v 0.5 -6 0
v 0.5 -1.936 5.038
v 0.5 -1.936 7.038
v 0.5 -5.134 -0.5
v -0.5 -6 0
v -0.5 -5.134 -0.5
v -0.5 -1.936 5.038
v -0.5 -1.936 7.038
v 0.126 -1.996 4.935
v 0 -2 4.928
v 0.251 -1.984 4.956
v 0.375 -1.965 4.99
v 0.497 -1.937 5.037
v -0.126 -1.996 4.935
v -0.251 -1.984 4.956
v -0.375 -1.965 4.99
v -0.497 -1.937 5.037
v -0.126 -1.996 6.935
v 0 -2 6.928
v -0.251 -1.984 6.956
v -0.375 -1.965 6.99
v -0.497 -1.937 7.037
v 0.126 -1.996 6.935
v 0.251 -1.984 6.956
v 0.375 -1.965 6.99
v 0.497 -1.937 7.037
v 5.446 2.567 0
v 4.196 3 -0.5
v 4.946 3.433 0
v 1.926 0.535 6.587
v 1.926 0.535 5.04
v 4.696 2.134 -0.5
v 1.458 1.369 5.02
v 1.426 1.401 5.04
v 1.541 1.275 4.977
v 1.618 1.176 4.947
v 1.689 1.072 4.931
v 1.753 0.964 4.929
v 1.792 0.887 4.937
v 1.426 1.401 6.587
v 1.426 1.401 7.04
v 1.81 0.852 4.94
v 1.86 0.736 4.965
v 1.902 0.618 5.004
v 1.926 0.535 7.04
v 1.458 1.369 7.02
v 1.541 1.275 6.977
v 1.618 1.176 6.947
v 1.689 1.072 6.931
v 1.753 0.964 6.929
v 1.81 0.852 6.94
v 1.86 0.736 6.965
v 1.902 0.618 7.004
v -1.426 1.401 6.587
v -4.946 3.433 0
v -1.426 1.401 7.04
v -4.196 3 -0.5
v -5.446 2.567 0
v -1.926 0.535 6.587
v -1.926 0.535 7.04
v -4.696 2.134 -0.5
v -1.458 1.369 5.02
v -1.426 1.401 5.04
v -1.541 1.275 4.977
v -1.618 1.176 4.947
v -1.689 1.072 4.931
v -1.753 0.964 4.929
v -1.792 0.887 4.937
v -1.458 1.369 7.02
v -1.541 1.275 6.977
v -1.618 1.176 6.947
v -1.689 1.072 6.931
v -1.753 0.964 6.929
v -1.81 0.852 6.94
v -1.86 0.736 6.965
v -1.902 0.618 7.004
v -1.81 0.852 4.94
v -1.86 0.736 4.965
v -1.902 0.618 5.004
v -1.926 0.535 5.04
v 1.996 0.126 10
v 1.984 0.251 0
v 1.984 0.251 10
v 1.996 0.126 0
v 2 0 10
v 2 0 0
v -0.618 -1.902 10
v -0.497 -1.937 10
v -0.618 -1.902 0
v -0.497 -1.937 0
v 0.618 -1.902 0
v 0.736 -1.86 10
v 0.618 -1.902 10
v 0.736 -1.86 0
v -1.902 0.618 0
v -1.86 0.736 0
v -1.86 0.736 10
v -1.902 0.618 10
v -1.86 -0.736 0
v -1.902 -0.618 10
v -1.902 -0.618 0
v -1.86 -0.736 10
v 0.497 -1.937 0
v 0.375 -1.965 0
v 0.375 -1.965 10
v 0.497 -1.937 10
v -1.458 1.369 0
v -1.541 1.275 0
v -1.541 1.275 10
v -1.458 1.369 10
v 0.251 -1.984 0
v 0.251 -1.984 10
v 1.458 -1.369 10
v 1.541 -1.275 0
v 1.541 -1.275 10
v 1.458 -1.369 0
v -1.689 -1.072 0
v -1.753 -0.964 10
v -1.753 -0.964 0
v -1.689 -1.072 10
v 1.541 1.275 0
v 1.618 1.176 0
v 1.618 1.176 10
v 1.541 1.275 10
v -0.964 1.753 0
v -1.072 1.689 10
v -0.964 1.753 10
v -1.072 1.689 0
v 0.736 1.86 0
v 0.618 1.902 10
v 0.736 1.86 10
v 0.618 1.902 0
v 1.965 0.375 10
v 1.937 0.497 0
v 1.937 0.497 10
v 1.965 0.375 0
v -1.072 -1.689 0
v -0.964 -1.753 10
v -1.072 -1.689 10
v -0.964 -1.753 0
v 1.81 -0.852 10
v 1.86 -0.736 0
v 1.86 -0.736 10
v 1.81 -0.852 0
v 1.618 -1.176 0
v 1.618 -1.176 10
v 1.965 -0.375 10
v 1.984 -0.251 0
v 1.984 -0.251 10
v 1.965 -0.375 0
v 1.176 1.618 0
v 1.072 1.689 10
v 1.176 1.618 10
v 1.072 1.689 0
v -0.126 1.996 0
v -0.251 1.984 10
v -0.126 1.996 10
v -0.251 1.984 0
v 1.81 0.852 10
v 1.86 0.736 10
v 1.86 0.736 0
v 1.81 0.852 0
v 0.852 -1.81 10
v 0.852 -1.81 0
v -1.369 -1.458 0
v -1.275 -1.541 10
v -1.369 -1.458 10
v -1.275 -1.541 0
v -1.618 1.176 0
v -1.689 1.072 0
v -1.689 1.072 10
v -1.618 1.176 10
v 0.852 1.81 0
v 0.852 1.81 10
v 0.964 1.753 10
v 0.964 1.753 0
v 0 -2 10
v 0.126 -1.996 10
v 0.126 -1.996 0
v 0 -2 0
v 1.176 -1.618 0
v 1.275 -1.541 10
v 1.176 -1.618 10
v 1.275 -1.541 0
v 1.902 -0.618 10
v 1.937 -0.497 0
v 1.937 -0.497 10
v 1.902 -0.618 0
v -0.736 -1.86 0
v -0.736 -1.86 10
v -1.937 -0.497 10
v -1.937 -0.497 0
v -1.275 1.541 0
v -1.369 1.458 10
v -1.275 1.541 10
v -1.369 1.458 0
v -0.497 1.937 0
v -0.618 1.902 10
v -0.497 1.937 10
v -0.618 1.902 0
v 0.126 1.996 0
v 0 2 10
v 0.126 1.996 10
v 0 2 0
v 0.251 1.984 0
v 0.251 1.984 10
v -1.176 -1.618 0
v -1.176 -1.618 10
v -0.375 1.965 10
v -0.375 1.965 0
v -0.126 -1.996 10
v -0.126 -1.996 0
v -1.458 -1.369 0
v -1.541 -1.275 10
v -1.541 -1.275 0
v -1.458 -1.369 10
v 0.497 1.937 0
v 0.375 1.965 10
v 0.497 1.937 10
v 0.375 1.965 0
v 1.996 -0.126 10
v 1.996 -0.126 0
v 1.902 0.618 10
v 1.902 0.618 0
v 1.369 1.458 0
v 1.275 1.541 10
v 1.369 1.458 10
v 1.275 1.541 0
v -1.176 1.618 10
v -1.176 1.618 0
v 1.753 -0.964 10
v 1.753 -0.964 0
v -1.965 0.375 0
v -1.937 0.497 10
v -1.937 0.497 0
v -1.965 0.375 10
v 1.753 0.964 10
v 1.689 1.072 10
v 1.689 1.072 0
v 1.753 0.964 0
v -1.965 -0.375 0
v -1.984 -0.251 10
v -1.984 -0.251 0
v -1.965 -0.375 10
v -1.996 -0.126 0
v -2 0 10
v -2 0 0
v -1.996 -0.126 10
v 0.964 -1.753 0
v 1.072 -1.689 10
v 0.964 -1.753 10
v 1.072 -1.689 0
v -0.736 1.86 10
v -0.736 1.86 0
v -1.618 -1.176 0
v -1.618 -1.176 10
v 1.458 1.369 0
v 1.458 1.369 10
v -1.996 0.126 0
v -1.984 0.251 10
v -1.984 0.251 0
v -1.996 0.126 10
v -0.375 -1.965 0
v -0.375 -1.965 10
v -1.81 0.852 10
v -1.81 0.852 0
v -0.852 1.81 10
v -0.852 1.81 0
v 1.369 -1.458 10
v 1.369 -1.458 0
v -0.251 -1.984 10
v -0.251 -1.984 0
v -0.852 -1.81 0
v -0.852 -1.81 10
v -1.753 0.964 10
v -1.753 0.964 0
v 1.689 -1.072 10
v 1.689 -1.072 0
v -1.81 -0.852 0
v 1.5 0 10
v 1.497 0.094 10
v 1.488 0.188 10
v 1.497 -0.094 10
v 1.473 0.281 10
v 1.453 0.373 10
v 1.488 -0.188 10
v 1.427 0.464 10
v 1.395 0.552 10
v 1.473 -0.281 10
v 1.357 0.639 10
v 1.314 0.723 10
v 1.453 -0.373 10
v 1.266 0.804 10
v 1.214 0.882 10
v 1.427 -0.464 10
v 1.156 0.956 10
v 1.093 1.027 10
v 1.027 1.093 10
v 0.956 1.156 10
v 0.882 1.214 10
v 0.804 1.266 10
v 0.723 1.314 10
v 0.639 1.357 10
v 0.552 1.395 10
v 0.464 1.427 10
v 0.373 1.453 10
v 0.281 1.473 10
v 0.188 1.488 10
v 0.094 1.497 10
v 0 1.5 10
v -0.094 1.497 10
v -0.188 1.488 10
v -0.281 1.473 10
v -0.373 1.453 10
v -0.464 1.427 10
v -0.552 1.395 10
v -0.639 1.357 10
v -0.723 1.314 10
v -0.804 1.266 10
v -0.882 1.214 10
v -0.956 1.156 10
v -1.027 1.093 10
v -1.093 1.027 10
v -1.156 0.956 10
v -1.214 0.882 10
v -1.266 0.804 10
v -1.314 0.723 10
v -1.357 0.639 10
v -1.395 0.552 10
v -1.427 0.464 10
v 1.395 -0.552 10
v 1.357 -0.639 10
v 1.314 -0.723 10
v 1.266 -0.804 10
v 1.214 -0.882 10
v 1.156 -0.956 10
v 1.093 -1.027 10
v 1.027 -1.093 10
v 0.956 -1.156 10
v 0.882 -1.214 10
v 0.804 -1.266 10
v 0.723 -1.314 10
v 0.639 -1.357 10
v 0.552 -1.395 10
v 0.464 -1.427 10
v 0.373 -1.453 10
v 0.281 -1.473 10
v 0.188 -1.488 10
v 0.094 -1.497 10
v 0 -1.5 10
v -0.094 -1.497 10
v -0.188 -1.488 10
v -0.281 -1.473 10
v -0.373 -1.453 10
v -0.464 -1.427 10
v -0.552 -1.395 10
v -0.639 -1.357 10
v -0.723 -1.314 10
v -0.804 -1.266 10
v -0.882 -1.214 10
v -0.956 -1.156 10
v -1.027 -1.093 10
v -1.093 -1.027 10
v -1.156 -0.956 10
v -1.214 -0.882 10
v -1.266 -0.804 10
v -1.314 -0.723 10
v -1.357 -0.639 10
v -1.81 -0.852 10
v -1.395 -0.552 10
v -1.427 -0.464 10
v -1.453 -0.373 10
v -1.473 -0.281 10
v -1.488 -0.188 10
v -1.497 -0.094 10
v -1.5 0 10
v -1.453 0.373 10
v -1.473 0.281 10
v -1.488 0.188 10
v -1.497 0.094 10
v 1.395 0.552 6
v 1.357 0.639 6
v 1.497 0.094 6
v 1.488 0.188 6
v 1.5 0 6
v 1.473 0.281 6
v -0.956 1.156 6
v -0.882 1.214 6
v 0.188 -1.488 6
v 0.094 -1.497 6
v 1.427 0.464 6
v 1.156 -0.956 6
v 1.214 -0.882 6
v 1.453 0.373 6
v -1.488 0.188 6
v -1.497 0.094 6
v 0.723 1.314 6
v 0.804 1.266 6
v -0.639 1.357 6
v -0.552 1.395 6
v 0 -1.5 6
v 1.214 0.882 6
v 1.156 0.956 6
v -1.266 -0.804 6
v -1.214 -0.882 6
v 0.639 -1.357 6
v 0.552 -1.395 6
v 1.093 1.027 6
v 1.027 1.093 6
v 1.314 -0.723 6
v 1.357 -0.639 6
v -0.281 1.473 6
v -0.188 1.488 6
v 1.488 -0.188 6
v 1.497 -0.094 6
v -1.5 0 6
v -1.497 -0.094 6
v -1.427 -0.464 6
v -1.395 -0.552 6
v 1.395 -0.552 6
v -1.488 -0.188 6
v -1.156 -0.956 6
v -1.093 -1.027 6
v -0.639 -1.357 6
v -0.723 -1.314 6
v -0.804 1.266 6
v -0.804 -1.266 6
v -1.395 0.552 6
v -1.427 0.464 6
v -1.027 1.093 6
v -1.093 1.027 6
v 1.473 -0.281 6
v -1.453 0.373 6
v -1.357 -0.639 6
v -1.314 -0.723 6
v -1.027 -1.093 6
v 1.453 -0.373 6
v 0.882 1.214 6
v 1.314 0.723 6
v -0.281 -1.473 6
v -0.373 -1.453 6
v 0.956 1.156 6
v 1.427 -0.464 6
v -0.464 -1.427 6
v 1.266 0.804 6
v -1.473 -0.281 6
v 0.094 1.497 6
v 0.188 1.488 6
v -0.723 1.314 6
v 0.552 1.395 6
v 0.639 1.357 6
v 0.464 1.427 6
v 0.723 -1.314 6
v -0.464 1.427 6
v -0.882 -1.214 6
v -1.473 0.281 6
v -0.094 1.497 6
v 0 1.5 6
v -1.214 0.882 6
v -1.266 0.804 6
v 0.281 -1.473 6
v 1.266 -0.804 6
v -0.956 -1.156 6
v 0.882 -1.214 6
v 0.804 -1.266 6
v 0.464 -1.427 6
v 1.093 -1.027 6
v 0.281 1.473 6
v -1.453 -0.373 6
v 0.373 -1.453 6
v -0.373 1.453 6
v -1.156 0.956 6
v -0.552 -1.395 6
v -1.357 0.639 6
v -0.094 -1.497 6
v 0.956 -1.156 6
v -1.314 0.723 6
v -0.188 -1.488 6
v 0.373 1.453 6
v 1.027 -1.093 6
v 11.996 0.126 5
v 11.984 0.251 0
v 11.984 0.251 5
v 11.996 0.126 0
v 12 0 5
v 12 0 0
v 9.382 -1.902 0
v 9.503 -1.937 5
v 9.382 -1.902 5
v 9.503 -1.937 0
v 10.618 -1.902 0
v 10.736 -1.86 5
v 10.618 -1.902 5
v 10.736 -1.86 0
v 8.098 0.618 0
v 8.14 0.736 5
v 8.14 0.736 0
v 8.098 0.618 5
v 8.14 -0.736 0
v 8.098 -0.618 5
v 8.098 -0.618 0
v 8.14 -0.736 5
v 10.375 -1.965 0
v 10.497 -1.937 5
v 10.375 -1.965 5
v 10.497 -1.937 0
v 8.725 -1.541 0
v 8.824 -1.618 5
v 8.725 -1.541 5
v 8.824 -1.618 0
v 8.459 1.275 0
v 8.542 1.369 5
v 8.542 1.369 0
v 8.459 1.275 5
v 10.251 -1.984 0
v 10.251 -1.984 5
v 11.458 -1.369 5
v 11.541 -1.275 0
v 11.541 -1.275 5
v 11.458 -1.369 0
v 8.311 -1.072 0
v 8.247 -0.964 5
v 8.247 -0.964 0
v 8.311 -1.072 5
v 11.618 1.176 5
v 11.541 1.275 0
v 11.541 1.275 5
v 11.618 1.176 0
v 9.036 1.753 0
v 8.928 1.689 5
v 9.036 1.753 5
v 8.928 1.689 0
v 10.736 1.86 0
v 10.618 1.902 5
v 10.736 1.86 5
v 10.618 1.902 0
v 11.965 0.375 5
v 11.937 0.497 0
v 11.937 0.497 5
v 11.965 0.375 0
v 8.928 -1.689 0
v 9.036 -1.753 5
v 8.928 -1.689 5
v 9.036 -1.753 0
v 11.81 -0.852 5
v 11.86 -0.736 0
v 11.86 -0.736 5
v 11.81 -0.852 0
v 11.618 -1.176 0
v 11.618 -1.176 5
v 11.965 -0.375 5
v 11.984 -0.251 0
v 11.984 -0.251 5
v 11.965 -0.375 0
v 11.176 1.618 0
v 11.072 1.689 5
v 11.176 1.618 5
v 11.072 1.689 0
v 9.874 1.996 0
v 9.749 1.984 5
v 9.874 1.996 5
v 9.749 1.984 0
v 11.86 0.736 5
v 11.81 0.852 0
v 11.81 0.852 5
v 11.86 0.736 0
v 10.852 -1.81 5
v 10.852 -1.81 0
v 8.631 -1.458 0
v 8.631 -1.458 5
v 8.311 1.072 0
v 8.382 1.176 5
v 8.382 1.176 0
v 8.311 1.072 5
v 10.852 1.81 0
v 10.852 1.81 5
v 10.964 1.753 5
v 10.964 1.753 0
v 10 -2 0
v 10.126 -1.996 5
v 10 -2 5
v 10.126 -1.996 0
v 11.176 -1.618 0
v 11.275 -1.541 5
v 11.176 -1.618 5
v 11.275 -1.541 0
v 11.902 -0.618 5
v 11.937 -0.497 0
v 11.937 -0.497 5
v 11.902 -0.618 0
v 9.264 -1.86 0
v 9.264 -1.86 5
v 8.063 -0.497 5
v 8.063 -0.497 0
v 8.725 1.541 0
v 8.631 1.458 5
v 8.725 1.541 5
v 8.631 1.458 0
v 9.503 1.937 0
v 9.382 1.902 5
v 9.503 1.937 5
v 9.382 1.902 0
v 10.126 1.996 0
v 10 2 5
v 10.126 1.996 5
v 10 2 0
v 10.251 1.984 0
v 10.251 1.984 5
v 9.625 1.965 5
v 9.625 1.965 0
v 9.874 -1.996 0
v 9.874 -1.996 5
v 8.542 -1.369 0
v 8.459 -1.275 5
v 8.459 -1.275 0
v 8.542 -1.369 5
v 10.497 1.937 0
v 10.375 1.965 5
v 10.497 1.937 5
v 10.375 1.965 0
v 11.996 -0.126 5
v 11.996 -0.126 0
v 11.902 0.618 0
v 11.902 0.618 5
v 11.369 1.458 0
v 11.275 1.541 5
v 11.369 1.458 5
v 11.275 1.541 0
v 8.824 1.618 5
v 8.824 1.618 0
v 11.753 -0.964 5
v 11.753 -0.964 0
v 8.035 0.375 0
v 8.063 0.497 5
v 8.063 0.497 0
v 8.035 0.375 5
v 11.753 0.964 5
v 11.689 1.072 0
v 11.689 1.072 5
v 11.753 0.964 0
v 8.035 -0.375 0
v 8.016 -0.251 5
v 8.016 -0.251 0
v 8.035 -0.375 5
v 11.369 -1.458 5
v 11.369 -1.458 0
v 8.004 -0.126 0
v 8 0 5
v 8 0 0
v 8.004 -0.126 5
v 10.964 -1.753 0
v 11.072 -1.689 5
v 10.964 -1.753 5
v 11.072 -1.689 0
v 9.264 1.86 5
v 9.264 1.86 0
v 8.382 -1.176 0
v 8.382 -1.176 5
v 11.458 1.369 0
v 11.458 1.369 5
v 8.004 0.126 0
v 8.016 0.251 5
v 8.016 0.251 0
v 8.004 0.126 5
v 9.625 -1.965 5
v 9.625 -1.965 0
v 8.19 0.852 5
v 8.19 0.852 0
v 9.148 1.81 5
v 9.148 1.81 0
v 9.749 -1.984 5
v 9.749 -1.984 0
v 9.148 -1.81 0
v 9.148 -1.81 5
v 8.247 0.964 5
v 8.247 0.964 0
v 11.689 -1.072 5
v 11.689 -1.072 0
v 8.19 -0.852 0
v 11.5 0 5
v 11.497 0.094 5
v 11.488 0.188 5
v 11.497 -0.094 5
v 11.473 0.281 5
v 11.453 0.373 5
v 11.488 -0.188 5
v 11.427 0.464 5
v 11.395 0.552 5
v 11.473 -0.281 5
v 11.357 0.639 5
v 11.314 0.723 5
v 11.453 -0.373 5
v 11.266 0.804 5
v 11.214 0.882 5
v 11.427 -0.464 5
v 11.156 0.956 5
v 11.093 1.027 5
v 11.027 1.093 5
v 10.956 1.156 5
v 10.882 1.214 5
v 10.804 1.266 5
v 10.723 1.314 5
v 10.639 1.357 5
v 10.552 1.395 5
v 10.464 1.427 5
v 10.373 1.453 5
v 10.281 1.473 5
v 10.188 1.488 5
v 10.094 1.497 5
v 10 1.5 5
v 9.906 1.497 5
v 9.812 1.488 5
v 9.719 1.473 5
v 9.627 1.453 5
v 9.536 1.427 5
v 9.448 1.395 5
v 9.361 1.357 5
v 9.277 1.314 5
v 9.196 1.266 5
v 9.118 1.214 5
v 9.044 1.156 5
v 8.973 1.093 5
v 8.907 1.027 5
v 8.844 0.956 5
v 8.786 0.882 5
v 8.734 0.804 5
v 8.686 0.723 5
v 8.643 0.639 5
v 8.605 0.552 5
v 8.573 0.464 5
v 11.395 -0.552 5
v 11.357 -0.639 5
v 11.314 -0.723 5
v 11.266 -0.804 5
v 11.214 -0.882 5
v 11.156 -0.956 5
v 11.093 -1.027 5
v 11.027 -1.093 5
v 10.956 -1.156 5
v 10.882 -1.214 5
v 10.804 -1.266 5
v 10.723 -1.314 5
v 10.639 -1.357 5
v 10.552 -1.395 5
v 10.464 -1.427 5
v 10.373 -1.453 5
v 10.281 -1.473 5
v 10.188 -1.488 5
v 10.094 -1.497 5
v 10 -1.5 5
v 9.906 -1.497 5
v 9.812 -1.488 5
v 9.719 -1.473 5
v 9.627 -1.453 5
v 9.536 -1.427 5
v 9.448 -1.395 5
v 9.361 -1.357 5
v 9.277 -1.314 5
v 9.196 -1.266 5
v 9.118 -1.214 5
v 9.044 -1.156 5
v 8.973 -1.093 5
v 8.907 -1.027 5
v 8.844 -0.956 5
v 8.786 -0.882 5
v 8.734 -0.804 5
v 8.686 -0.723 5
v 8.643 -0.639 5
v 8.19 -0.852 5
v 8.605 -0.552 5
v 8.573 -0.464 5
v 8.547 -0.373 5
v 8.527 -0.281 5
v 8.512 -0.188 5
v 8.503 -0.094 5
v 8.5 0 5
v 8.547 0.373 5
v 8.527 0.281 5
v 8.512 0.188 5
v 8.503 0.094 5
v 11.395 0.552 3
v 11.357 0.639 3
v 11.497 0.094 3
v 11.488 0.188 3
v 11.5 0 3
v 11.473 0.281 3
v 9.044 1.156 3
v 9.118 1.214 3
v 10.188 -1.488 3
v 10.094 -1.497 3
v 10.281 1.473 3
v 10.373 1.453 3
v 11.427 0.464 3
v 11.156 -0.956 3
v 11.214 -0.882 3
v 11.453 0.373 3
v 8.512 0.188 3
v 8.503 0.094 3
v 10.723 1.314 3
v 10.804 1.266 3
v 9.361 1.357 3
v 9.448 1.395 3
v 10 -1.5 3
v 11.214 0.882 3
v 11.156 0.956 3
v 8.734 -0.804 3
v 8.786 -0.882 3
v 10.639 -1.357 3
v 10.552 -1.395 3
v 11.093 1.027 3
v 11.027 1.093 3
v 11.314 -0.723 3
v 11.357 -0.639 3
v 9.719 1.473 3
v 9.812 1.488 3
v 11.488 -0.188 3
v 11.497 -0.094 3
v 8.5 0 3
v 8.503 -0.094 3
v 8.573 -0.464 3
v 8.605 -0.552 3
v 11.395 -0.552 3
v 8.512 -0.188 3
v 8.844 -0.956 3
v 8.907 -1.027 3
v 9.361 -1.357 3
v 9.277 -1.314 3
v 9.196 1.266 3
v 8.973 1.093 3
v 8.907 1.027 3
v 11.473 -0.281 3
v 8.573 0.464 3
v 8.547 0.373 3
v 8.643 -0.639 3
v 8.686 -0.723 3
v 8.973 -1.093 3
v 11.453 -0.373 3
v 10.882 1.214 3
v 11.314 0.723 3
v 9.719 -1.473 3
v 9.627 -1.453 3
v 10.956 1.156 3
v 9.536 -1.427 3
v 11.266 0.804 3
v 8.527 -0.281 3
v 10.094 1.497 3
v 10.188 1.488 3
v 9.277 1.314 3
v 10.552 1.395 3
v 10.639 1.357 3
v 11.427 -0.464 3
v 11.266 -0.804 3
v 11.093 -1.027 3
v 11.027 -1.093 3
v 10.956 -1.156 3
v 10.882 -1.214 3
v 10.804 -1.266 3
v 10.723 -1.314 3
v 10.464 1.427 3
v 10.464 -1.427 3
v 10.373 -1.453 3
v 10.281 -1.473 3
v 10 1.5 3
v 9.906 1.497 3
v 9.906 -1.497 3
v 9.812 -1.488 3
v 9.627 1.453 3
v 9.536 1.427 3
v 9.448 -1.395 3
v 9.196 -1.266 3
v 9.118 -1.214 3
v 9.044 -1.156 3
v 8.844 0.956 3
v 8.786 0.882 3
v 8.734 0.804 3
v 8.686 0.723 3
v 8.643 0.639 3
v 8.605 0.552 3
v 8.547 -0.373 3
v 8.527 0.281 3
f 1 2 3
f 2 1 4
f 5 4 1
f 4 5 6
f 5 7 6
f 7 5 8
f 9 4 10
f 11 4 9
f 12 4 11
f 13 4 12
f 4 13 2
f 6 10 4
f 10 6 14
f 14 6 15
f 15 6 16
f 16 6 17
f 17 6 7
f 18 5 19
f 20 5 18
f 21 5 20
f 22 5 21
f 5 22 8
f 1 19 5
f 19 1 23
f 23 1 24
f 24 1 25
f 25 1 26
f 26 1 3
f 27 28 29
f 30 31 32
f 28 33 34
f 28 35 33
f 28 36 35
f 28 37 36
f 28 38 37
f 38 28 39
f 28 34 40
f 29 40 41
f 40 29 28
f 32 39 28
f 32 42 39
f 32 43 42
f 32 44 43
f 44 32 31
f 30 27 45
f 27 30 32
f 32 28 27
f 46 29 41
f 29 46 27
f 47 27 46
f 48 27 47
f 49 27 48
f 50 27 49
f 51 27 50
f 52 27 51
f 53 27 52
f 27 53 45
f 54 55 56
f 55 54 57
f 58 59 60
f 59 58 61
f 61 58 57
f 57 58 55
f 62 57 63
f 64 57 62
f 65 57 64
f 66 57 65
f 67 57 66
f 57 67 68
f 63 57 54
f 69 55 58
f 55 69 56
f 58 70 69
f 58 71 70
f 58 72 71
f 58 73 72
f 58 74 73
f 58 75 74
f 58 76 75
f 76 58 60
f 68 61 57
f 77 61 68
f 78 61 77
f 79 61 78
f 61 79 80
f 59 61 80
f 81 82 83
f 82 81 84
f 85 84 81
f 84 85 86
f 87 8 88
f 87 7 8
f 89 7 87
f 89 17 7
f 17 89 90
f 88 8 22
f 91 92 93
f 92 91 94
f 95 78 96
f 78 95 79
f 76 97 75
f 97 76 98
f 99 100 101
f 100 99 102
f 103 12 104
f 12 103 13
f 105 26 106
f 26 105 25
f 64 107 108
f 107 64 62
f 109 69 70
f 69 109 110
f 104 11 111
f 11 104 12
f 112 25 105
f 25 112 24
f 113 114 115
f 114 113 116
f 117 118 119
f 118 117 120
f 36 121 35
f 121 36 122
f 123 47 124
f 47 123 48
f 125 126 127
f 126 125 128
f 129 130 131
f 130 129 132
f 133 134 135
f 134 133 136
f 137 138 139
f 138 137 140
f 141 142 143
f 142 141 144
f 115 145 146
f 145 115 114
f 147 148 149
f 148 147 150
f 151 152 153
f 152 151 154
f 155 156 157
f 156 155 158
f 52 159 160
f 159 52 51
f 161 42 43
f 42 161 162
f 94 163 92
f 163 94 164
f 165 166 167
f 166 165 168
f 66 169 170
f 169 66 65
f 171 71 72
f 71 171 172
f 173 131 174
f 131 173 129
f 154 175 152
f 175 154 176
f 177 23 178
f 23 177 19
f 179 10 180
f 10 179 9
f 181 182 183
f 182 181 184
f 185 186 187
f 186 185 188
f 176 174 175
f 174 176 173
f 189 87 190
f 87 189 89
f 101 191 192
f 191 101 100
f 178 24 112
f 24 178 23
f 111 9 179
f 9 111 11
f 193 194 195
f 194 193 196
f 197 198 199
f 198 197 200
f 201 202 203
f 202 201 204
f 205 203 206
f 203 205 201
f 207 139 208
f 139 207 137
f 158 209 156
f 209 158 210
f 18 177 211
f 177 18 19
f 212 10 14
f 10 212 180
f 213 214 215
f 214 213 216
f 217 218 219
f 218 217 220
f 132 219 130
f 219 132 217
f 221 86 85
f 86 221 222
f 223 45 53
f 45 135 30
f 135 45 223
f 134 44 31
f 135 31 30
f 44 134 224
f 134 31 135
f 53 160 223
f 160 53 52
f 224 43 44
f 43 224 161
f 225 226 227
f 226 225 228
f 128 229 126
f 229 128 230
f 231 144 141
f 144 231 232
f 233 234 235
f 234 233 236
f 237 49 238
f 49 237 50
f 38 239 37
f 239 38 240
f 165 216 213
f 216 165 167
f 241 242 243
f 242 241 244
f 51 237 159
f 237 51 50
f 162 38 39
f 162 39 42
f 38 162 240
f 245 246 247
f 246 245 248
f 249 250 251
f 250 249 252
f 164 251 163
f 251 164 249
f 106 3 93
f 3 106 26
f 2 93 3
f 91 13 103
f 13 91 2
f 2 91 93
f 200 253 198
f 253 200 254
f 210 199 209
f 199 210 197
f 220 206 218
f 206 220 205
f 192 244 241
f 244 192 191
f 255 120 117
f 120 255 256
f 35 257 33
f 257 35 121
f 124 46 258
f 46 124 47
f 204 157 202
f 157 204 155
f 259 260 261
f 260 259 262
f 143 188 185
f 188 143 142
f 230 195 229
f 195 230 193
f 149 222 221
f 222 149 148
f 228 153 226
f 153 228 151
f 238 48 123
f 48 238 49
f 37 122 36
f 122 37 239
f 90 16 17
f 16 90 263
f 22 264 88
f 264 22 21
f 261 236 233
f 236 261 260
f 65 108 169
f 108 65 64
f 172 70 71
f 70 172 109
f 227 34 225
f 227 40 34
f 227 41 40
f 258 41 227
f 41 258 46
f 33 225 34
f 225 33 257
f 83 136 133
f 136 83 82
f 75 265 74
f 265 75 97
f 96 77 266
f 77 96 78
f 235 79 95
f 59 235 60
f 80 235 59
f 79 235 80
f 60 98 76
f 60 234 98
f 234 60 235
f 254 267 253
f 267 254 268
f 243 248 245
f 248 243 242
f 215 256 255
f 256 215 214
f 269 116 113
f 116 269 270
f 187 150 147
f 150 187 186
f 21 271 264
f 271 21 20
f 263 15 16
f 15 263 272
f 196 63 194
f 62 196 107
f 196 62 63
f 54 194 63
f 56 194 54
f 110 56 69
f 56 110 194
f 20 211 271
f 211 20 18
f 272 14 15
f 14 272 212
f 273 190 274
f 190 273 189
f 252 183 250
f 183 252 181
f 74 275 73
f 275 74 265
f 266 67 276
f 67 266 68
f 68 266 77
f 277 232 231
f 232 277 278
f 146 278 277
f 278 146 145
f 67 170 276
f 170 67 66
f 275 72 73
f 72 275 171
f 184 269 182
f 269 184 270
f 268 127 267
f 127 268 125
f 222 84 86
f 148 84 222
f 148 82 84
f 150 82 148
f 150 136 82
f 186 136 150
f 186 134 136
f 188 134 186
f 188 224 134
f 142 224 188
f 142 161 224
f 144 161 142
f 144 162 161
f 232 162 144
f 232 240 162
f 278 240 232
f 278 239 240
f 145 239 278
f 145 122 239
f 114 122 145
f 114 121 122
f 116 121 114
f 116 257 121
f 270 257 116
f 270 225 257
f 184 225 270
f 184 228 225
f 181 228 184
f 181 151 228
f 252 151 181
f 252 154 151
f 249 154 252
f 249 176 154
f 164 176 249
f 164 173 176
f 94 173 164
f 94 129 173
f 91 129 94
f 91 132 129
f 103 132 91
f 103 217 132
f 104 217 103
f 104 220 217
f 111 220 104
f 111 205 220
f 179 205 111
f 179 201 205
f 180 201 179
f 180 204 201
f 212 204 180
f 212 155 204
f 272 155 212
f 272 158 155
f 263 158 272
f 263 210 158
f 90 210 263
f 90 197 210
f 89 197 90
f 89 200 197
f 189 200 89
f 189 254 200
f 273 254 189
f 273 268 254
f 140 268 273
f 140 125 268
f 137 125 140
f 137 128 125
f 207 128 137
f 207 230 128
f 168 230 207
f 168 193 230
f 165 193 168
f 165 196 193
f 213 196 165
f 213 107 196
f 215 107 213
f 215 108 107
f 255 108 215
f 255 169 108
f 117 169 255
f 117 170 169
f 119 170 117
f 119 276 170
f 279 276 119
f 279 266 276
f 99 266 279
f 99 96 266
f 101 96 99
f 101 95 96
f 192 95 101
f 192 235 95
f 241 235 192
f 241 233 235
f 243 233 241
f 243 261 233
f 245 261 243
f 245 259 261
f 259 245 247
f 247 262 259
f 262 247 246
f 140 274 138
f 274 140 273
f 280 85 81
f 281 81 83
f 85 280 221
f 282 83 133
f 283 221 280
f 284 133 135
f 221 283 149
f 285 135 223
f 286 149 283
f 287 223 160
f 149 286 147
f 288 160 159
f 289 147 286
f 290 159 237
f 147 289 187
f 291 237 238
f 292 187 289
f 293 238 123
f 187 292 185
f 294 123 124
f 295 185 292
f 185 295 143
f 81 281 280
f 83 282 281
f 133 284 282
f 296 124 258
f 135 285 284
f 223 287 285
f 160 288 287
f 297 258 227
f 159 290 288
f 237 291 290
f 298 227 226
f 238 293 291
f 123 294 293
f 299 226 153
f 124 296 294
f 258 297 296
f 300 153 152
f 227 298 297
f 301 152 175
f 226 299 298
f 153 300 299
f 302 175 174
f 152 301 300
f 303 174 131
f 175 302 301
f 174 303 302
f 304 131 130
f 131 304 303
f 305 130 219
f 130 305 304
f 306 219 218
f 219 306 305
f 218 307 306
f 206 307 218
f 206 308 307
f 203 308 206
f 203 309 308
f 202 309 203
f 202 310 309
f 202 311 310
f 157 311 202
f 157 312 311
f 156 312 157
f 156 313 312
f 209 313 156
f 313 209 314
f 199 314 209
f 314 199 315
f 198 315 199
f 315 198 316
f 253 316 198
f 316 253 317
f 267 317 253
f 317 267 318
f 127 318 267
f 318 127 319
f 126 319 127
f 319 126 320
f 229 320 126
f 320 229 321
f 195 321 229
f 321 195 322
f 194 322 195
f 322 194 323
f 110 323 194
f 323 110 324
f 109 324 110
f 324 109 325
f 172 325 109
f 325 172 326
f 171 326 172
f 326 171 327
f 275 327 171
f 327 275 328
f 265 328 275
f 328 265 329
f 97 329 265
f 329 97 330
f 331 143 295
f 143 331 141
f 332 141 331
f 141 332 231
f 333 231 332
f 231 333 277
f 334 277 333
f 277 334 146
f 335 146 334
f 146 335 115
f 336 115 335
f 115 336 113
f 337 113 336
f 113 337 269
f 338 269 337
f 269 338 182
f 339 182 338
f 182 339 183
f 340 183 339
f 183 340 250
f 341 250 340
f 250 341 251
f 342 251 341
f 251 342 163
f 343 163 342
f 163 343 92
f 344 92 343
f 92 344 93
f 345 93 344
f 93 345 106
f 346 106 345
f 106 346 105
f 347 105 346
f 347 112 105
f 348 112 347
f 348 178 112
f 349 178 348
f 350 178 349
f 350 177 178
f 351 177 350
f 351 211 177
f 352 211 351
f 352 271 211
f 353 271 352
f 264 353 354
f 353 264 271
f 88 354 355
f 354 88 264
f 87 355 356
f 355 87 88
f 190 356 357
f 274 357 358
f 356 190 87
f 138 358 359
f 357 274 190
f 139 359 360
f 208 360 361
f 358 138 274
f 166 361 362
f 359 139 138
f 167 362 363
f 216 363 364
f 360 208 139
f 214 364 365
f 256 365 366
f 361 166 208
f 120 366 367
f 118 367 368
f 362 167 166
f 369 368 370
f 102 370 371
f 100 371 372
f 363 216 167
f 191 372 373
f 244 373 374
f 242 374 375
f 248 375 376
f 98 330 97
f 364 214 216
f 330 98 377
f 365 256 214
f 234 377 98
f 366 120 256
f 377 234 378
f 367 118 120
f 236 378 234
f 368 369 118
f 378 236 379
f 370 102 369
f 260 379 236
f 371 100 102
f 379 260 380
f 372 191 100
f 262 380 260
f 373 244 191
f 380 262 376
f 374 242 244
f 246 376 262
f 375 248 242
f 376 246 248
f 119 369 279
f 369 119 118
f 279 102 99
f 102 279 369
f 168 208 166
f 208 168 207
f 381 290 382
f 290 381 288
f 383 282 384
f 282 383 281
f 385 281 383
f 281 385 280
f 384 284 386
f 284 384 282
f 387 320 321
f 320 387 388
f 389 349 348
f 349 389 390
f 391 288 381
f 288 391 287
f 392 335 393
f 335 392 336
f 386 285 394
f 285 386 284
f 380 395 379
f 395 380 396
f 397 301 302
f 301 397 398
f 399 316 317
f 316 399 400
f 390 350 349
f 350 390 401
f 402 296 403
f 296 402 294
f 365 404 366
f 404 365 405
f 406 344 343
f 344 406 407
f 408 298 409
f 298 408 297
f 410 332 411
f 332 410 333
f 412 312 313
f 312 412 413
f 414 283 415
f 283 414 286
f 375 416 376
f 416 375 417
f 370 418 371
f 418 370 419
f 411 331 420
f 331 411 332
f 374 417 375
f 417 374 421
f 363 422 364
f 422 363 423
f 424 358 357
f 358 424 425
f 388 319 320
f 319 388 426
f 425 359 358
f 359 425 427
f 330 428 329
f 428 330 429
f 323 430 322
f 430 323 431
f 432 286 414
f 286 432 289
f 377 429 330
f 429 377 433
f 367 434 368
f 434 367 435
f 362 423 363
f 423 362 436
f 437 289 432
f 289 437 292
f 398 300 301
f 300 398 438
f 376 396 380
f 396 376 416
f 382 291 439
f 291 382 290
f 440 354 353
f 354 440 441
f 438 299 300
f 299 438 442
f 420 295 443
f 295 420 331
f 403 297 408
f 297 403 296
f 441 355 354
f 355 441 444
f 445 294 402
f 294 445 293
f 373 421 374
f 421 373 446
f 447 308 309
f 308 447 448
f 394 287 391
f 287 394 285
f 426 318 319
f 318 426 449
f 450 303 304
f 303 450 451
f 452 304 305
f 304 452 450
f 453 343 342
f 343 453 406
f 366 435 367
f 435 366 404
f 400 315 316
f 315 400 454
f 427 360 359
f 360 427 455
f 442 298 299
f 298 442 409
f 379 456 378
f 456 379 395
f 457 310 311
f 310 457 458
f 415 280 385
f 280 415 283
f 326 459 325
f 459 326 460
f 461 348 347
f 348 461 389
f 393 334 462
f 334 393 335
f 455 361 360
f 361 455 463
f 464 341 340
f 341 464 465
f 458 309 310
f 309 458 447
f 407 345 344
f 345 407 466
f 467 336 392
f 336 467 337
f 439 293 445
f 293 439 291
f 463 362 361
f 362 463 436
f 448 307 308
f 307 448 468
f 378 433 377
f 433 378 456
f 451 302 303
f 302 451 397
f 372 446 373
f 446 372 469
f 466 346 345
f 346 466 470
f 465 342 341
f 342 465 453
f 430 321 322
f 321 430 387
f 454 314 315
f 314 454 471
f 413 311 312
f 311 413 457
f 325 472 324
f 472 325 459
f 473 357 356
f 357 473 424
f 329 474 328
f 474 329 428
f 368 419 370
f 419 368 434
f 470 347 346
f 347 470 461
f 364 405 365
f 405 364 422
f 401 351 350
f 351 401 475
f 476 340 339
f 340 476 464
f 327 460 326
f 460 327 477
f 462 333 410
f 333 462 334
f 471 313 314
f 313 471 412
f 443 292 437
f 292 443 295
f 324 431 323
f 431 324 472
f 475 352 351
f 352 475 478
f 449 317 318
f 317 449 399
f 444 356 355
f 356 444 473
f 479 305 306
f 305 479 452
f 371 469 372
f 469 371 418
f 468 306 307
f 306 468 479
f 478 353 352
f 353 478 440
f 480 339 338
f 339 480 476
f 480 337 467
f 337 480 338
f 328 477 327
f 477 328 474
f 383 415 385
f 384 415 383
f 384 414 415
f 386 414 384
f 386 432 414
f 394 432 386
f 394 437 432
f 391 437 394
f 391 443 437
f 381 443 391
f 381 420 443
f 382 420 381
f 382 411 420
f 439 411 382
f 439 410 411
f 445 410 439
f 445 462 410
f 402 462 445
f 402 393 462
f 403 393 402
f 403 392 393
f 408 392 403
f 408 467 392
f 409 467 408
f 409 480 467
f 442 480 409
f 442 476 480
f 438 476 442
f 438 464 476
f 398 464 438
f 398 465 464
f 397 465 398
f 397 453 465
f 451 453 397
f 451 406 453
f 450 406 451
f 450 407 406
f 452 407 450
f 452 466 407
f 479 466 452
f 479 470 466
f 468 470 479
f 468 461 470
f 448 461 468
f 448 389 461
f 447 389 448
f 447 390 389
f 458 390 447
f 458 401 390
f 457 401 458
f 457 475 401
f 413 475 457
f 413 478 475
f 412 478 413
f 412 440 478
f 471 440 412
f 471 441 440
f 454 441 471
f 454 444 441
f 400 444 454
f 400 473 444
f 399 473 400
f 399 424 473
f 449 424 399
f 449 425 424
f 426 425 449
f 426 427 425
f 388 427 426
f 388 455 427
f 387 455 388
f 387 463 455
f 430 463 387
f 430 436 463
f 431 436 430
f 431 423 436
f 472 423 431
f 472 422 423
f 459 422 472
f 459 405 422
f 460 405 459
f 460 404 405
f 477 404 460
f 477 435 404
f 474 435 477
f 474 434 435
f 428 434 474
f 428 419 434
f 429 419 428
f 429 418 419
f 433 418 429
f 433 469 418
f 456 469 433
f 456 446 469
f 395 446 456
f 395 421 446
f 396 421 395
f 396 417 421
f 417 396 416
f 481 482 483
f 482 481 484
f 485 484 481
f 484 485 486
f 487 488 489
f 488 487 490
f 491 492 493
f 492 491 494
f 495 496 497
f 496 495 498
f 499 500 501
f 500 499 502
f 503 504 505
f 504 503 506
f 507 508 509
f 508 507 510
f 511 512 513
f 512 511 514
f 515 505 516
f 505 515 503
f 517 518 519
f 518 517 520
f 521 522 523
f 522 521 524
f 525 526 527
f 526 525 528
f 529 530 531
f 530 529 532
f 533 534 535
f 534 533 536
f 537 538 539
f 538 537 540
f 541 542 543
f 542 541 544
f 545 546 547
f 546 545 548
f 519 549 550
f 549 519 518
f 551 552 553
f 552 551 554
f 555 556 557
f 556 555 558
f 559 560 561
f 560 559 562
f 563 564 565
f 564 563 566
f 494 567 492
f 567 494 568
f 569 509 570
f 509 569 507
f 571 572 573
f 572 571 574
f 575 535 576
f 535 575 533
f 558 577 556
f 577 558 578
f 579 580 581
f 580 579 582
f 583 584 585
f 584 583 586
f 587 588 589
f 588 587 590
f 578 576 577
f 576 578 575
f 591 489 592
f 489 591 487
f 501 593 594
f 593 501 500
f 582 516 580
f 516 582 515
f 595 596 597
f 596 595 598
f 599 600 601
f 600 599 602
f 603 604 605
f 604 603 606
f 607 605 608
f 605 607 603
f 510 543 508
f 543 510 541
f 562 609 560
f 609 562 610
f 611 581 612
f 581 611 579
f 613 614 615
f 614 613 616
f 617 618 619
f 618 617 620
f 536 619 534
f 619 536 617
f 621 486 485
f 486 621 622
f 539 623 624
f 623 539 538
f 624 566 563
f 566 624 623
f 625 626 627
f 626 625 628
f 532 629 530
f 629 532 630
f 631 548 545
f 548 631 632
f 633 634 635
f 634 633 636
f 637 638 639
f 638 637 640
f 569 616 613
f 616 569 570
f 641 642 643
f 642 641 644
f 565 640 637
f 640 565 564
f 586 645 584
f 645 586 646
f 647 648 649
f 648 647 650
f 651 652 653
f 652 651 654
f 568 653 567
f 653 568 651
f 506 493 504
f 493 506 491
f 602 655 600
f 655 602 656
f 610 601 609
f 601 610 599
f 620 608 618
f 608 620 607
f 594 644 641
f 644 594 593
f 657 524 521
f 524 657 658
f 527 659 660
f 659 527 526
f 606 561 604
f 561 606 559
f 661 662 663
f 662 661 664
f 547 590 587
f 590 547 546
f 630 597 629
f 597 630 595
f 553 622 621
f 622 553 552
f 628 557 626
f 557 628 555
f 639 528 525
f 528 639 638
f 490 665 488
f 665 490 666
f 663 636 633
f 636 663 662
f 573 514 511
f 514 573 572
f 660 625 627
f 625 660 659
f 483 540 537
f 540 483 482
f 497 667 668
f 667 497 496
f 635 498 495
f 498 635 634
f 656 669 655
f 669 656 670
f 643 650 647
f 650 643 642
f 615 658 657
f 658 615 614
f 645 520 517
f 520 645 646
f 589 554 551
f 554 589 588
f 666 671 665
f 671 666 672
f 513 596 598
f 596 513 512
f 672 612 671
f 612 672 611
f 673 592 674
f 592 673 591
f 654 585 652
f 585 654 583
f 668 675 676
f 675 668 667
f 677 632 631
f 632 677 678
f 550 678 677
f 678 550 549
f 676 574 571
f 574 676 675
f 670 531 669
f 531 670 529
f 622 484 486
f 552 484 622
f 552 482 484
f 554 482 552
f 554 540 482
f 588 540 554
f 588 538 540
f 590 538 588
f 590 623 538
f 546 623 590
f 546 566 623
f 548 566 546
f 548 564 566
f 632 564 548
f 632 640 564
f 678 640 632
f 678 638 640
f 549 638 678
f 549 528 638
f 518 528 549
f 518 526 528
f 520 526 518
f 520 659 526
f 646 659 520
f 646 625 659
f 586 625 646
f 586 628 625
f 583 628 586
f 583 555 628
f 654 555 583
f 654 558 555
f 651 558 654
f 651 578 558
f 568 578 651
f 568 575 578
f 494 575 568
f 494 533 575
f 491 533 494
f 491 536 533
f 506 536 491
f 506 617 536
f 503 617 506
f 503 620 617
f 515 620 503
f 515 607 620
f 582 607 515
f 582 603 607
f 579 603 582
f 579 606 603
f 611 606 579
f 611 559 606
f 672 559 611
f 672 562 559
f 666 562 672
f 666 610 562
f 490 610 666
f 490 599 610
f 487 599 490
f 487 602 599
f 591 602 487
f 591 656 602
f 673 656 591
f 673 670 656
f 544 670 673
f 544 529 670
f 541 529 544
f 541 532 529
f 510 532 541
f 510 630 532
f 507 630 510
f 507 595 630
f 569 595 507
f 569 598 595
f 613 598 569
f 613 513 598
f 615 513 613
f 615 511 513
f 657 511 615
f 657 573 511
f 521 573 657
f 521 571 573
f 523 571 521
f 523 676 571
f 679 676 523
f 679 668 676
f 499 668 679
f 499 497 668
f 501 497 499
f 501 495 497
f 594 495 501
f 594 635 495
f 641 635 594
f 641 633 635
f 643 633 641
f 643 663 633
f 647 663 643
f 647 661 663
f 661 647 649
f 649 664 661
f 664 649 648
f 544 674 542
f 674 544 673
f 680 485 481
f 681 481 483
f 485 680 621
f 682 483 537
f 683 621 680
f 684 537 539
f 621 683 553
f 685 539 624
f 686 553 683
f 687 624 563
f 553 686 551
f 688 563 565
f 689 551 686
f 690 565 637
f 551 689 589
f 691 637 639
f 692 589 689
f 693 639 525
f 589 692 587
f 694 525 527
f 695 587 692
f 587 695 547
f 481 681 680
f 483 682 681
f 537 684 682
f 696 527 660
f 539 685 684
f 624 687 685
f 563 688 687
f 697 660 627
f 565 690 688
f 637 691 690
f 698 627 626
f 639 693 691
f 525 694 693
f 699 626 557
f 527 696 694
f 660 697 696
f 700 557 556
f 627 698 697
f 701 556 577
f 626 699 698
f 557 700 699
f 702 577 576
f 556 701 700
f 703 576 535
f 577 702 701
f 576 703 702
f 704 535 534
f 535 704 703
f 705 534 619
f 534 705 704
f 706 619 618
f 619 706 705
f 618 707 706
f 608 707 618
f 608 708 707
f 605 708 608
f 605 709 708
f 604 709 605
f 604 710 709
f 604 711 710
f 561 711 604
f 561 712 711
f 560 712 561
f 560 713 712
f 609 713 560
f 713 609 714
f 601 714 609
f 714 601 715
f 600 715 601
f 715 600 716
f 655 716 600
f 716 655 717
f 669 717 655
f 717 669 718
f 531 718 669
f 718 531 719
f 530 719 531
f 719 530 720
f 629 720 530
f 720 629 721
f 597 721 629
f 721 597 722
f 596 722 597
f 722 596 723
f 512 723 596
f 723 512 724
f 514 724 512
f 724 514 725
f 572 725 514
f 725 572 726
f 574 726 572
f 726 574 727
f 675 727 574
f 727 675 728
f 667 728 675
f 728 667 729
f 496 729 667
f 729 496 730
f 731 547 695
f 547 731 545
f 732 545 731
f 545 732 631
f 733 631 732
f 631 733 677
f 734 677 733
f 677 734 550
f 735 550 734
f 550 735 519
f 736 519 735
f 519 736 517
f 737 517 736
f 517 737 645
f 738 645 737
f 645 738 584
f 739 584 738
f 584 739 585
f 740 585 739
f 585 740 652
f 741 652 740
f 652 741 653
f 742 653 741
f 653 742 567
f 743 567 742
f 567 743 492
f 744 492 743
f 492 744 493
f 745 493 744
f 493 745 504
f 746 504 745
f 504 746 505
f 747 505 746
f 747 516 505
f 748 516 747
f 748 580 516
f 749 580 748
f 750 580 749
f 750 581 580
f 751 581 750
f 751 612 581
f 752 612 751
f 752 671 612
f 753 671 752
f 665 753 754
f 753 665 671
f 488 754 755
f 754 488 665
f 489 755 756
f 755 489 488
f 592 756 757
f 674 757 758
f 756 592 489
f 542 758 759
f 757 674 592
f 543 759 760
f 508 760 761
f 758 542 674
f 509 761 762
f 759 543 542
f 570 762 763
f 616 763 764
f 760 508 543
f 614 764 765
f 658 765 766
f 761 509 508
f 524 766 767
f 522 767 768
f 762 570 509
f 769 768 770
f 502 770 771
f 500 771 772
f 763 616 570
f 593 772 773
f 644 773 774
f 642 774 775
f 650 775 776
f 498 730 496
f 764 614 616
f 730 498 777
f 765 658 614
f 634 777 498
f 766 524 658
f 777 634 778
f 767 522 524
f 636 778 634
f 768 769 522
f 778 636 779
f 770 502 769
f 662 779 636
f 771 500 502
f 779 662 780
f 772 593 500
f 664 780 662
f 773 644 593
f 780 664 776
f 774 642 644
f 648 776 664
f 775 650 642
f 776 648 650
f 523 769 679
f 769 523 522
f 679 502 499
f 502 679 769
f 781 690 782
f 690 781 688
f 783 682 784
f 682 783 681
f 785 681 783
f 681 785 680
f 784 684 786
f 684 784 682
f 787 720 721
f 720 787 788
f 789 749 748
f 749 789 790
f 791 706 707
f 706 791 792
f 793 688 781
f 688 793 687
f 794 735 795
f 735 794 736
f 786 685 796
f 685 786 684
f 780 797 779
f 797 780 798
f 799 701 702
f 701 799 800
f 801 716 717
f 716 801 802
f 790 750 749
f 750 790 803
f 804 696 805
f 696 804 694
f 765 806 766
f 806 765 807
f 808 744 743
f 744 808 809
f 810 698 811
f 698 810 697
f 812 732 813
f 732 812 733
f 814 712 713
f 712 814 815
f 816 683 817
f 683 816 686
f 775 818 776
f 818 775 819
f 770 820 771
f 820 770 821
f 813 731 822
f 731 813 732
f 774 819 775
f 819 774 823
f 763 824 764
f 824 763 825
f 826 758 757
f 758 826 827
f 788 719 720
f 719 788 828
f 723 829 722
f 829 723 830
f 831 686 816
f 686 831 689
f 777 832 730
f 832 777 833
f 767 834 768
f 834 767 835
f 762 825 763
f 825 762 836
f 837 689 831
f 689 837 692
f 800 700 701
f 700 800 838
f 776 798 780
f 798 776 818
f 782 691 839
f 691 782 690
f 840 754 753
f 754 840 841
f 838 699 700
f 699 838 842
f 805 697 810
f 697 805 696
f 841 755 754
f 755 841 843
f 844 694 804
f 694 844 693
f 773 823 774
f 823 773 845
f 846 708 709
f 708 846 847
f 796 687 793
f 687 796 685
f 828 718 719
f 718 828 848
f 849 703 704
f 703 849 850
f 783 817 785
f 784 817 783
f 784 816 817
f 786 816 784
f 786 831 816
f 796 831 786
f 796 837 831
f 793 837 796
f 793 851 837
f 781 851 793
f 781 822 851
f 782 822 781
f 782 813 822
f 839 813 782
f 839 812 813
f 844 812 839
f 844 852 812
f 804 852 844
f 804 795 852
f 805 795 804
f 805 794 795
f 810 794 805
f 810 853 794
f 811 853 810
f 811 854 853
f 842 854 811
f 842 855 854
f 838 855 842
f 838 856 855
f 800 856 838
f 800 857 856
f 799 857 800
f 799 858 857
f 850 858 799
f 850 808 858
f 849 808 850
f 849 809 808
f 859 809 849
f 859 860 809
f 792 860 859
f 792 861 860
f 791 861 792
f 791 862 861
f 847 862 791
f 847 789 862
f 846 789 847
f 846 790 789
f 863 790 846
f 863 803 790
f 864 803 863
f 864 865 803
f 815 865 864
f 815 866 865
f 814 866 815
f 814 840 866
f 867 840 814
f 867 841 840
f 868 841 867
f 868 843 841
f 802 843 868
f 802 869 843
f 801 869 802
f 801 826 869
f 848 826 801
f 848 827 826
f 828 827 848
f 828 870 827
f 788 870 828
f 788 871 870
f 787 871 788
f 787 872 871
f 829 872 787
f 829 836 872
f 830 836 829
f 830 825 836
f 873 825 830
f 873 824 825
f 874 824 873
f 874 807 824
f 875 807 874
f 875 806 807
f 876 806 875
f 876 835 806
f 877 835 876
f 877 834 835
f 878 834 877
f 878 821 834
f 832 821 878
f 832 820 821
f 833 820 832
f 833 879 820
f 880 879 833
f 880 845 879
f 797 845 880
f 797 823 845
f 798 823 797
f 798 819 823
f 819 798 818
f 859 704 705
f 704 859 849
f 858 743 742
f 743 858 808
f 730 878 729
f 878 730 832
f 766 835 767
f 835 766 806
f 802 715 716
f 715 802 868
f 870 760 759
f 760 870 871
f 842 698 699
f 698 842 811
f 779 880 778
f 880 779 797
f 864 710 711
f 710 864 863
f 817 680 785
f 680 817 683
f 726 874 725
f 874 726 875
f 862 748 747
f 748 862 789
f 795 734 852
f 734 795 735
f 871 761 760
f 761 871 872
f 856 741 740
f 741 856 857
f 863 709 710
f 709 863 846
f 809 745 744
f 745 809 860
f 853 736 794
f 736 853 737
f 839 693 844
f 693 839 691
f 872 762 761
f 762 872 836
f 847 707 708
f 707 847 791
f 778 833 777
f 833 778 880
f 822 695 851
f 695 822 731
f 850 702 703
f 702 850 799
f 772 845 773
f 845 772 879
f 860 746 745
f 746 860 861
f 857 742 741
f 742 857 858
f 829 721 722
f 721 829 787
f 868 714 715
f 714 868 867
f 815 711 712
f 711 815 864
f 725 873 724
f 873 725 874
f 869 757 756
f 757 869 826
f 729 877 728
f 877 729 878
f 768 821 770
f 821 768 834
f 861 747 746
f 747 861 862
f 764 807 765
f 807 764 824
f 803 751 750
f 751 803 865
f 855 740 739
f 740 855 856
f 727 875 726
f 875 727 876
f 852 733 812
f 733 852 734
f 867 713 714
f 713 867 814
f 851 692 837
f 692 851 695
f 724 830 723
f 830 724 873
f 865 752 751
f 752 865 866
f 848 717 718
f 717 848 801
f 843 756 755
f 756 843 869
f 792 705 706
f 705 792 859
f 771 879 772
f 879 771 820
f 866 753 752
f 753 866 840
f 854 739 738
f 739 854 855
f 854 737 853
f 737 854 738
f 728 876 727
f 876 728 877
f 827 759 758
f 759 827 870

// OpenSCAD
$fn = 100; 
   
strength = 0.2;
radius_bottom = 10;
radius_top = 2;

module leg()
{
  translate([-0.5,-6,0])
    rotate([-30,0,0])
        cube([1,1,10]);
}

module sensor_holder()
{
  difference()
  {
    tripod();   
    
    translate([0,0,6])
      cylinder(h=5,r=1.5);
  } 
}

module tripod()
{
  leg();
    
  rotate([0,0,120])
    leg();
    
  rotate([0,0,240])
    leg();
  
  //translate([0,0,-1])
    //cylinder(h=1,r=6);
  
  translate([0,0,0])
      cylinder(h=10,r=2);
}

module head()
{  
  difference()
  {
    translate([0,0,0])
      cylinder(h=5,r=2);
    
    translate([0,0,3])
      cylinder(h=2.5,r=1.5);
  }
}


sensor_holder();

translate([10,0,0])
  head();
